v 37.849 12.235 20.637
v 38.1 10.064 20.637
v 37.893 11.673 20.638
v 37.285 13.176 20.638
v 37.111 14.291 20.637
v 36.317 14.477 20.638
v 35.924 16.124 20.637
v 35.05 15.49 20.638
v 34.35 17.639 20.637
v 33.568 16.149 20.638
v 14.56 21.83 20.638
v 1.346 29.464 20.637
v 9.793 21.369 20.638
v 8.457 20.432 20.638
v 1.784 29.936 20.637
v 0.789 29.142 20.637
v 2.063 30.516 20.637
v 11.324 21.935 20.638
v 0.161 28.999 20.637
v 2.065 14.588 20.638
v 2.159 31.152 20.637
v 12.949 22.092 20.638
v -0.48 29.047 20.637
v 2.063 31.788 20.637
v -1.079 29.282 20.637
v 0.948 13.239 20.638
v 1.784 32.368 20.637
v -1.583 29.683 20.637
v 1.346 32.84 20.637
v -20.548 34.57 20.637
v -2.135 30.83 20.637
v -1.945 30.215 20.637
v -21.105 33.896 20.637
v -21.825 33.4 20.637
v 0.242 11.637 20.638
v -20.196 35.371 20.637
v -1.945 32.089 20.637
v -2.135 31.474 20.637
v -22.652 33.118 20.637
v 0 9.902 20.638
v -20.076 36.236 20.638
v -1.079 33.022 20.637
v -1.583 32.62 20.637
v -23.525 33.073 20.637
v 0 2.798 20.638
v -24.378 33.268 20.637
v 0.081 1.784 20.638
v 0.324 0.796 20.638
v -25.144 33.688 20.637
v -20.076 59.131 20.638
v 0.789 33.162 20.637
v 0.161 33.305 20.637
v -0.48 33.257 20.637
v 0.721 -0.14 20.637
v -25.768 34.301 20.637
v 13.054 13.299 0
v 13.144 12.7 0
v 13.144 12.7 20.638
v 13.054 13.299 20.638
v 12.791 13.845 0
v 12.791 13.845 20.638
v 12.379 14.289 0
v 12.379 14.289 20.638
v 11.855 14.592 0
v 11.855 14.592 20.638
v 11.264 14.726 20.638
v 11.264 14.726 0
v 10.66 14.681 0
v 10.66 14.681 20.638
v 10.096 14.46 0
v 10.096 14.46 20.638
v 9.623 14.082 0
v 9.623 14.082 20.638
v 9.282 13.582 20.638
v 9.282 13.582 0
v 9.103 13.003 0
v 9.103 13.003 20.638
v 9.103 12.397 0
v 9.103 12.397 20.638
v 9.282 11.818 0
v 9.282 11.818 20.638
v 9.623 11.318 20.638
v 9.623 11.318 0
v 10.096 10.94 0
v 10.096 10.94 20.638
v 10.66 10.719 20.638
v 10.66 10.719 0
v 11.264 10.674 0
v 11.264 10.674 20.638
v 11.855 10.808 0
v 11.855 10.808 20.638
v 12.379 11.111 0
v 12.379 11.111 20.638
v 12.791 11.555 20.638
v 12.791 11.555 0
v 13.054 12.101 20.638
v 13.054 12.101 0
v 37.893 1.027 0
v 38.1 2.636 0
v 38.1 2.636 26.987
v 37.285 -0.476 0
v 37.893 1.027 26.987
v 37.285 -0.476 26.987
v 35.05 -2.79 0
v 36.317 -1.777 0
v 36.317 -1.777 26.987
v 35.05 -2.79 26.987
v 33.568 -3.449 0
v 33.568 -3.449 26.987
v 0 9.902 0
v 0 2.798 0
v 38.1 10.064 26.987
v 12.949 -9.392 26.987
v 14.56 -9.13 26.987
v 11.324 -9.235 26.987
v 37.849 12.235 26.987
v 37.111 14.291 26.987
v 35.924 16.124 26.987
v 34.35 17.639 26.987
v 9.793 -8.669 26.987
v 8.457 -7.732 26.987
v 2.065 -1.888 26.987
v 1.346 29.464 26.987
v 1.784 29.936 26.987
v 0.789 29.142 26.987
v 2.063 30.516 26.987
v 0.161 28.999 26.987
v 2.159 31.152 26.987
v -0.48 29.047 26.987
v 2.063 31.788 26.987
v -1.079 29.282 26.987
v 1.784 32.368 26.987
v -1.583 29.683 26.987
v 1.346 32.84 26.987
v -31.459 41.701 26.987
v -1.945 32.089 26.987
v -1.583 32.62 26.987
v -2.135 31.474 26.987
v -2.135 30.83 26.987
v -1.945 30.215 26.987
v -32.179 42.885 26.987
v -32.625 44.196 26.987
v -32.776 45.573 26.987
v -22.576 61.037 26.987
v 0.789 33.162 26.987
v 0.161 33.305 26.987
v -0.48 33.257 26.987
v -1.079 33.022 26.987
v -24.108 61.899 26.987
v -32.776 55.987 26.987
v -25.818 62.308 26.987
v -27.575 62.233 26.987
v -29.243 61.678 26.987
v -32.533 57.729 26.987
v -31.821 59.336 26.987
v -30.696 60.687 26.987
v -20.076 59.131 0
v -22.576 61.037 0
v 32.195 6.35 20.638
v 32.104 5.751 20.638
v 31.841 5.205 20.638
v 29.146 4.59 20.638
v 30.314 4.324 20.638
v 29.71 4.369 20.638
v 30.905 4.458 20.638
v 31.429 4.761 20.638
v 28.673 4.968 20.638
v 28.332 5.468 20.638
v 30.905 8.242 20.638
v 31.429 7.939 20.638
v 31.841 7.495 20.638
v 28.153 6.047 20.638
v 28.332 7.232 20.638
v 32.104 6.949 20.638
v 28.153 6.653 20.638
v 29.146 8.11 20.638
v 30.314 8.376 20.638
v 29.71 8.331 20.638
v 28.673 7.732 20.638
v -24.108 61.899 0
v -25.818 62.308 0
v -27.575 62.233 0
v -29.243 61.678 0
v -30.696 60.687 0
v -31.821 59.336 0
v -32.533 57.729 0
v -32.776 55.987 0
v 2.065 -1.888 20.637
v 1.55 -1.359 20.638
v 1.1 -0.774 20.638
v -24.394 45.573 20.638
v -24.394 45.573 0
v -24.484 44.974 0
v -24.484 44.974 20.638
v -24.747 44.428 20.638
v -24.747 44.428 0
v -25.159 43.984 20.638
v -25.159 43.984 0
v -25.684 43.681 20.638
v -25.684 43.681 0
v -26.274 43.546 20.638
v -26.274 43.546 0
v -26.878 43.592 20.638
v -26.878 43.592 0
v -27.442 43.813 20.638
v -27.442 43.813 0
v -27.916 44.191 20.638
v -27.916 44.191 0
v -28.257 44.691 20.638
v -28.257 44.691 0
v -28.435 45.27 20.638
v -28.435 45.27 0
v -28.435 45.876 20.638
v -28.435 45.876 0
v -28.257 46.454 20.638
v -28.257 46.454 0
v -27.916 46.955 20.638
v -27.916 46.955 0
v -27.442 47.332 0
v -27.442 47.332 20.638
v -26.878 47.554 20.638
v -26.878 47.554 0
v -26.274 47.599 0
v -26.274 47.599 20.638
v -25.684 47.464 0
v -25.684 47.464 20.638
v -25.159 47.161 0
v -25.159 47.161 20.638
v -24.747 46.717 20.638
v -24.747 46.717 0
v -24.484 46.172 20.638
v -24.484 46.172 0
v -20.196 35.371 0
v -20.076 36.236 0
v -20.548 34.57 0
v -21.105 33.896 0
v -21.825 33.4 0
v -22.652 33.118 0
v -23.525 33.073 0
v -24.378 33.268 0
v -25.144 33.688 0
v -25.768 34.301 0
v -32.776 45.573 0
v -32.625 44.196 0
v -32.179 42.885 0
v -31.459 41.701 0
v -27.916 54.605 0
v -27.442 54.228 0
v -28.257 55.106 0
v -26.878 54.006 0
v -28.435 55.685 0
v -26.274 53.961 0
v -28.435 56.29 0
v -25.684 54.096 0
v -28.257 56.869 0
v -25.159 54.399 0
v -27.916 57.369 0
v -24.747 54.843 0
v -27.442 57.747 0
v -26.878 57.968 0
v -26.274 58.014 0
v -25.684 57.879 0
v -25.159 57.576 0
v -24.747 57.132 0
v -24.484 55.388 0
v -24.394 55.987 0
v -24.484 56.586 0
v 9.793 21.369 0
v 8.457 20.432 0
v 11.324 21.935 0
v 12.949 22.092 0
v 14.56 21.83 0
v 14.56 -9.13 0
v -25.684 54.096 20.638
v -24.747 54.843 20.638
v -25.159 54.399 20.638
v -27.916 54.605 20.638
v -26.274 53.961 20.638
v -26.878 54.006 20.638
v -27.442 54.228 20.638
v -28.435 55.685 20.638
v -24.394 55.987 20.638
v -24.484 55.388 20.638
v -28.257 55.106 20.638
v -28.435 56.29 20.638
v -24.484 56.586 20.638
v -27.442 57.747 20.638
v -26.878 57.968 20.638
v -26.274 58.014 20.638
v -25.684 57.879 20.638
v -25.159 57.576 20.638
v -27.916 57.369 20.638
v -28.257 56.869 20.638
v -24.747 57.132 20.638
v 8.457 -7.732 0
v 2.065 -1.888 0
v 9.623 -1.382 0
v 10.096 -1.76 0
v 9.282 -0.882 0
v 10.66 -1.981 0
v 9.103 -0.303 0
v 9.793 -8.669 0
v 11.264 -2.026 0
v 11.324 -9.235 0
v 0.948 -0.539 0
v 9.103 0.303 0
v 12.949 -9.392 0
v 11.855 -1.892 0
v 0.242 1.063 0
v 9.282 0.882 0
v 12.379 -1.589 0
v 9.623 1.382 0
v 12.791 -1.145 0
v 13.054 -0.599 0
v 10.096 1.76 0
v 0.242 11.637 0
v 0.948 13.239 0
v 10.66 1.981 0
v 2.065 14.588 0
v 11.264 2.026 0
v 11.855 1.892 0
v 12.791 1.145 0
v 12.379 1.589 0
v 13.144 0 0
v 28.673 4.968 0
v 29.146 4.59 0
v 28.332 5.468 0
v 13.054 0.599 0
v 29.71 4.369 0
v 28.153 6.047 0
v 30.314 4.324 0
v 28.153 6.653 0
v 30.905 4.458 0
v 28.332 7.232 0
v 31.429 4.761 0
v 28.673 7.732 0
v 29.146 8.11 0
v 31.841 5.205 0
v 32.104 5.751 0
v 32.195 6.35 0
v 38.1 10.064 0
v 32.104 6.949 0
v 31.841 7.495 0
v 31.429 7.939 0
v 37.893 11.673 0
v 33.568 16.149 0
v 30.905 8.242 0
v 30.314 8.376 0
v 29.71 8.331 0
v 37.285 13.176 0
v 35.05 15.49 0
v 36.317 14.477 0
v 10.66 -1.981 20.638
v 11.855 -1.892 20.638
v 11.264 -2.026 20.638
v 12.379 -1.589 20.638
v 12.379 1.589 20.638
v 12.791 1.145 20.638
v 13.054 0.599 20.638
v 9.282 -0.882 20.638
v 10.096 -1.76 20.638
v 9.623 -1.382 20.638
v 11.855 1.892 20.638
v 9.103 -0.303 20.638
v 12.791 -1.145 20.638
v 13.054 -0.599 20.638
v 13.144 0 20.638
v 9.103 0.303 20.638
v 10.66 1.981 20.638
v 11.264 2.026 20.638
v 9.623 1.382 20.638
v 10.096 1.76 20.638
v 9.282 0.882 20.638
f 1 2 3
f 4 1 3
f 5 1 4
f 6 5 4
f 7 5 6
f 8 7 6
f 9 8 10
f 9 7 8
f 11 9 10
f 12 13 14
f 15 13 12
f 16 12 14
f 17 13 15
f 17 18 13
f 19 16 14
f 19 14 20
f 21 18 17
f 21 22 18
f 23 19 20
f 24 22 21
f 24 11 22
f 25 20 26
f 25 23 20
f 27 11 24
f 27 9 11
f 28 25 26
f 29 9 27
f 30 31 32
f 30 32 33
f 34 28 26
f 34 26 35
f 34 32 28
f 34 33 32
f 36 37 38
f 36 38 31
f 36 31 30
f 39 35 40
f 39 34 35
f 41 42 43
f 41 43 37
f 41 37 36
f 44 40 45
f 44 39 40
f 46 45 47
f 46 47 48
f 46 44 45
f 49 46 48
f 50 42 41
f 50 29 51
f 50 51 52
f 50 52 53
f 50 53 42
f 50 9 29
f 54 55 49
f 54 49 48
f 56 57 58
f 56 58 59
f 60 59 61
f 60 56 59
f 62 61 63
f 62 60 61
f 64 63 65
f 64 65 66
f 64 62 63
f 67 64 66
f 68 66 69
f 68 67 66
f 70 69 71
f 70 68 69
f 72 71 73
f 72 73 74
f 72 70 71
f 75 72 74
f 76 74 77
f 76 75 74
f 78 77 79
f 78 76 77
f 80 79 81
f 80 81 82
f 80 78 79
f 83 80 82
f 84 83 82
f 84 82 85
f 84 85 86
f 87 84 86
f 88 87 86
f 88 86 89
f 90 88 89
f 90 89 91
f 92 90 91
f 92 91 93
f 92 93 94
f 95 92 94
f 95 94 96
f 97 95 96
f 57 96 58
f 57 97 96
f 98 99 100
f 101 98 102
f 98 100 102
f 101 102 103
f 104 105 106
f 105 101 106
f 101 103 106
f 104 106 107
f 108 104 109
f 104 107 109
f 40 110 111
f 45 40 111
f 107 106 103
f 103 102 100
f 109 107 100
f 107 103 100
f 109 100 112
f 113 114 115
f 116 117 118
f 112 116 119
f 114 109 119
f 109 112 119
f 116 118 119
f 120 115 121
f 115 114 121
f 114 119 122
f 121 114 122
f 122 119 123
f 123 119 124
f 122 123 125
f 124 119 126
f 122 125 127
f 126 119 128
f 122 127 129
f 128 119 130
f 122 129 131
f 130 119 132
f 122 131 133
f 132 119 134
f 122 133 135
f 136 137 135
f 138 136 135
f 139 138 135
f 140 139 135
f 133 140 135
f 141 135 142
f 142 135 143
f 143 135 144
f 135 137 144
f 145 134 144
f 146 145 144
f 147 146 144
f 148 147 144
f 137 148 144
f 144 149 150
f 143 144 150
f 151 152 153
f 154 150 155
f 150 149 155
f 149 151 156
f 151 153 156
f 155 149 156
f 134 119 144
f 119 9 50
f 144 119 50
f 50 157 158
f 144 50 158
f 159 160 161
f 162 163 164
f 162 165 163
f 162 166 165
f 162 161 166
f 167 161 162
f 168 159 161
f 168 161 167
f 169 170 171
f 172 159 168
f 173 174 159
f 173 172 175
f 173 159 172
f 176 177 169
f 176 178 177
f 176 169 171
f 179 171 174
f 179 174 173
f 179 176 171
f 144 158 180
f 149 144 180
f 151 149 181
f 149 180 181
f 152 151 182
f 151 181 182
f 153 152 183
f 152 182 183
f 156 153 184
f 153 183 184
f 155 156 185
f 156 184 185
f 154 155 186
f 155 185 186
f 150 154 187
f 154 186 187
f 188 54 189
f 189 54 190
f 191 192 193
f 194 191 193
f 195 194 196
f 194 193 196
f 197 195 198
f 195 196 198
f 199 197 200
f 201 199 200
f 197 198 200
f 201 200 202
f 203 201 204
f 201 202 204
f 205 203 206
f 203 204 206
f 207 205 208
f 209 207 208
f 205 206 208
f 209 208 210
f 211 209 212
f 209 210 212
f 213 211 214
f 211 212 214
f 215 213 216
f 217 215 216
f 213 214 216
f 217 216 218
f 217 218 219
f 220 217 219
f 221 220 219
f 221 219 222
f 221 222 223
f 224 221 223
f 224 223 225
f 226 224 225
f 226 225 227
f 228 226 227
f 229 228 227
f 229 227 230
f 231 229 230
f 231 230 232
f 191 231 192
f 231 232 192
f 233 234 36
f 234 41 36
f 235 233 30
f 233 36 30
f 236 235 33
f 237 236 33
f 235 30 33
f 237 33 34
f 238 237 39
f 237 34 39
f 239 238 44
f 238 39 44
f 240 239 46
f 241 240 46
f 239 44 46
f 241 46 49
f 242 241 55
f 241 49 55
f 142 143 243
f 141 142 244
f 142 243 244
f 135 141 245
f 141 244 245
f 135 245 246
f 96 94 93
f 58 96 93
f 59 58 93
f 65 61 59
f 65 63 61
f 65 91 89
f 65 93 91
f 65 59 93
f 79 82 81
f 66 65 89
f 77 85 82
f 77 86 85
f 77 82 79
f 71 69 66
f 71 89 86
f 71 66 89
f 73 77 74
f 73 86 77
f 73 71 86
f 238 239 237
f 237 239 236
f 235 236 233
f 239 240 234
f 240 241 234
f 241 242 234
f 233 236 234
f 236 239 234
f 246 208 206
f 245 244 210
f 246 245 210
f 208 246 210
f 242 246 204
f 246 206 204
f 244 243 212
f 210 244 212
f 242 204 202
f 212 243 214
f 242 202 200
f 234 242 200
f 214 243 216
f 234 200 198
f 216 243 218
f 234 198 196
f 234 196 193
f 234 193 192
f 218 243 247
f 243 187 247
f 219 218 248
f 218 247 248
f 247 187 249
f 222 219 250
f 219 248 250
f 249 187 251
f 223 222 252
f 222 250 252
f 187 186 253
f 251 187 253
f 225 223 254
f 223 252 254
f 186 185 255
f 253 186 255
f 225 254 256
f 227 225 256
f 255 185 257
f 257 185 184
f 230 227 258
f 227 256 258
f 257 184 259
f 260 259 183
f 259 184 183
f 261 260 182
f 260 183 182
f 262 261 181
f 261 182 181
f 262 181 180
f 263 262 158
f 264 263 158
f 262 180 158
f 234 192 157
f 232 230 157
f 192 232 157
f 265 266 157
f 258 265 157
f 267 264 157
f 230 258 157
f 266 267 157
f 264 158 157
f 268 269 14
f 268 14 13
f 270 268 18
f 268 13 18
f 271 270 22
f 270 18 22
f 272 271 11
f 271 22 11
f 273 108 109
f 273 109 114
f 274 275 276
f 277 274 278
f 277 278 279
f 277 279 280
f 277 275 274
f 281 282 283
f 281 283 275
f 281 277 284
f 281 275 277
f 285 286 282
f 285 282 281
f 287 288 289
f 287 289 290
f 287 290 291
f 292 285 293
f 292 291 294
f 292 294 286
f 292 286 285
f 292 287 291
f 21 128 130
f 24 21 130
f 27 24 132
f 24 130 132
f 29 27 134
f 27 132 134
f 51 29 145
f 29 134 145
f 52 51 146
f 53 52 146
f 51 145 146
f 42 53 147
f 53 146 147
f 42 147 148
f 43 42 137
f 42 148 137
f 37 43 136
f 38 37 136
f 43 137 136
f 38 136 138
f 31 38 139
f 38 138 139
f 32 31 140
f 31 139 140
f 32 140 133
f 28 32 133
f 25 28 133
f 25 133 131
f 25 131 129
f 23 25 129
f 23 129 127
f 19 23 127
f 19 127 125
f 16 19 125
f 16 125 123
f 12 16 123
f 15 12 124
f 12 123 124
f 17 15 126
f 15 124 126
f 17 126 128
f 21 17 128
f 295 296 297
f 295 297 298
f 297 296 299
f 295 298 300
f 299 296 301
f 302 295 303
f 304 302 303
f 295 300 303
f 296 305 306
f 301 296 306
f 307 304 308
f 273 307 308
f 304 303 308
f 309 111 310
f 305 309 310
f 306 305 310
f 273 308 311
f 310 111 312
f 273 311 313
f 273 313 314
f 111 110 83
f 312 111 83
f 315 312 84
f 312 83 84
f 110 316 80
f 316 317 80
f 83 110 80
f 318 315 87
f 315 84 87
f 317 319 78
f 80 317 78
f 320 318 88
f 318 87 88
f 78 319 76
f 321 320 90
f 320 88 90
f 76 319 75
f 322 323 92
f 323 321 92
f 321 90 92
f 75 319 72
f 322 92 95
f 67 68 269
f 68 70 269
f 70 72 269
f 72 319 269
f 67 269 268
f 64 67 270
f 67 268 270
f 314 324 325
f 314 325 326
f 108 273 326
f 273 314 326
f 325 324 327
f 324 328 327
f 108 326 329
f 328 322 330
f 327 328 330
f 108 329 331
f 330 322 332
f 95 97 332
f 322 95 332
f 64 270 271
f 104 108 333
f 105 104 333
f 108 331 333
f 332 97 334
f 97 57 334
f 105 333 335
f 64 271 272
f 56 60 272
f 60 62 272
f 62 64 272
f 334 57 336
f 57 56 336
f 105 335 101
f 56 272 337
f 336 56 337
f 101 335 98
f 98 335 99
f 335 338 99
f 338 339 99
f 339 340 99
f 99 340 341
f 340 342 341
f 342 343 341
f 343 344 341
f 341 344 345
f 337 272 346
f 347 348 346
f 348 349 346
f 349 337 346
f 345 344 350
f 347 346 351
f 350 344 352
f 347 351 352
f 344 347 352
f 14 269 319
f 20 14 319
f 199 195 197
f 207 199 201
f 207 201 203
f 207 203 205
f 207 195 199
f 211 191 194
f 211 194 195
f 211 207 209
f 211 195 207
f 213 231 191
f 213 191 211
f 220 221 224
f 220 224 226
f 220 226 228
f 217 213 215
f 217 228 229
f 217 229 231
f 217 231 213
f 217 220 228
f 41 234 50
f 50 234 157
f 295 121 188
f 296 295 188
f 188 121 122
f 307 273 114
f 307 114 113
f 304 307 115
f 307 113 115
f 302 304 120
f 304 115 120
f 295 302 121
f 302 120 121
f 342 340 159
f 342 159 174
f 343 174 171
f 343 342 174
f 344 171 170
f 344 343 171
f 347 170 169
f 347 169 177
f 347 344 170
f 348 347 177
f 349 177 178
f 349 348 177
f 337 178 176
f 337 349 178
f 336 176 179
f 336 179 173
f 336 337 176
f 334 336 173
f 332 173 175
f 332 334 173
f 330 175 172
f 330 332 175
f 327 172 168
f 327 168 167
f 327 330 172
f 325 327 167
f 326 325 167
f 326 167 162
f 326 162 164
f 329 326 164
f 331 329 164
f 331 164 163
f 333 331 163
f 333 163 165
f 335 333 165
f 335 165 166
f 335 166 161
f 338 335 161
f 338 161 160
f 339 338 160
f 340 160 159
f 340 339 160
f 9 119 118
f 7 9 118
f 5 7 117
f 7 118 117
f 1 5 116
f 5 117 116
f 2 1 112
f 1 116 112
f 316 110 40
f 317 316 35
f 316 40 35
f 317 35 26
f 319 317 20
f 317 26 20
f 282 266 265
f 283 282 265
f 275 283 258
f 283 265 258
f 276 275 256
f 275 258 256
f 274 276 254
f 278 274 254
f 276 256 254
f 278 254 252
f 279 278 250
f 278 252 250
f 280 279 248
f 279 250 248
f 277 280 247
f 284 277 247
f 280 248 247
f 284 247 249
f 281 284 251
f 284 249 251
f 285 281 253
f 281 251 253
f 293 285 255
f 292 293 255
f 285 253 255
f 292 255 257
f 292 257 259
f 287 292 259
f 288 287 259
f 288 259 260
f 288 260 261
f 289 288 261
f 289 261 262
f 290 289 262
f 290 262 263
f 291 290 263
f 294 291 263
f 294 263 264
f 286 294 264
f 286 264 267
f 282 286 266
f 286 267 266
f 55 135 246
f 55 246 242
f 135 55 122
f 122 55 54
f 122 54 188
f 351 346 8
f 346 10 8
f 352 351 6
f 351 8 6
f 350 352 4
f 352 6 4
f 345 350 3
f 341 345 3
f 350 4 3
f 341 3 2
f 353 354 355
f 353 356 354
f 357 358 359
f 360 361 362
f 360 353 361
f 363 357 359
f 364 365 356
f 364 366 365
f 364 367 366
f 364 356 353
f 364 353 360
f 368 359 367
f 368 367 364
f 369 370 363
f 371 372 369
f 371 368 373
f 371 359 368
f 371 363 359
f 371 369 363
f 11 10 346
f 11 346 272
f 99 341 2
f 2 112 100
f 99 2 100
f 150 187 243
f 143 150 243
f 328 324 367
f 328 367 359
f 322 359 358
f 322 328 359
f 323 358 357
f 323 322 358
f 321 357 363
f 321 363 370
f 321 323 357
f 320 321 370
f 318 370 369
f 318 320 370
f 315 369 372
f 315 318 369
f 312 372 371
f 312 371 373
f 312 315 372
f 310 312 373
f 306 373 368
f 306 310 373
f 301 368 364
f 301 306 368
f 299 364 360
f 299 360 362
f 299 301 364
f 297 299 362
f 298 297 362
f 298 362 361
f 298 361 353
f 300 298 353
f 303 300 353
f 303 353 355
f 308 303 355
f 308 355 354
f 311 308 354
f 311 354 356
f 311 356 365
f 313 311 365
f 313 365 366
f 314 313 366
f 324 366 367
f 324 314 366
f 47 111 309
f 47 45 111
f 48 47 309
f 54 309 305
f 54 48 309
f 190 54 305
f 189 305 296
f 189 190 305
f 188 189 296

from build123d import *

# Parameters (mm, degrees)
SKETCH1_R           = 2.0319999999999987
SKETCH1_R_2         = 2.0320000000000005
BOSS_EXTRUDE1_DEPTH = 20.6375
FILLET1_R           = 6.35
BOSS_EXTRUDE2_START = 6.35
SKETCH3_R           = 2.159000000000005
BOSS_EXTRUDE2_DEPTH = 6.35
FILLET2_R           = 6.35
BOSS_EXTRUDE3_START = 20.6375
SKETCH4_R           = 2.032
BOSS_EXTRUDE3_DEPTH = 20.6375
FILLET3_R           = 3.175


with BuildPart() as part:
    # Sketch1 → Boss-Extrude1 (new body)
    with BuildSketch(Plane.XY):
        Polygon((0, 12.7), (0, 0), (11.112499999999999, -10.159999999999995), (38.1, -2.094157314500878), (38.1, 14.794157314500877), (11.112499999999999, 22.86), align=None)
        with Locations((11.112499999999999, 0)):
            Circle(SKETCH1_R, mode=Mode.SUBTRACT)
        with Locations((30.1625, 6.35)):
            Circle(SKETCH1_R_2, mode=Mode.SUBTRACT)
        with Locations((11.112499999999999, 12.7)):
            Circle(SKETCH1_R, mode=Mode.SUBTRACT)
    extrude(amount=BOSS_EXTRUDE1_DEPTH)

    # Fillet1
    fillet1_edges = [part.edges().sort_by_distance(p)[0] for p in [
        (0, 12.7, 10.31875),
        (11.112499999999999, 22.86, 10.31875),
        (38.1, 14.794157314500877, 10.31875),
        (38.1, -2.094157314500878, 10.31875),
        (11.112499999999999, -10.159999999999995, 10.31875),
        (0, 0, 10.31875),
    ]]
    fillet(fillet1_edges, radius=FILLET1_R)

    # Sketch3 → Boss-Extrude2 (add)
    with BuildSketch(Plane.XY.offset(20.6375).offset(BOSS_EXTRUDE2_START)):
        with BuildLine():
            Line((2.06521558288966, -1.888197104356259), (-32.77594211232474, 43.413196146372826))
            Line((-32.77594211232474, 43.413196146372826), (-32.77594211232474, 68.81319614637282))
            Line((-32.77594211232474, 68.81319614637282), (34.3497413303207, 17.639286263258136))
            ThreePointArc((34.3497413303207, 17.639286263258136), (37.1111008713377, 14.290641479729842), (38.1, 10.064460353186902))
            Line((38.1, 10.064460353186902), (38.1, 2.635539646813099))
            ThreePointArc((38.1, 2.635539646813099), (36.84259970760916, -1.157602614961311), (33.56836906517824, -3.448540722708889))
            Line((33.56836906517824, -3.448540722708889), (14.560051921917028, -9.129618843824993))
            ThreePointArc((14.560051921917028, -9.129618843824993), (11.324248271129079, -9.235318696210516), (8.456898439628453, -7.732021430517442))
            Line((8.456898439628453, -7.732021430517442), (2.06521558288966, -1.888197104356259))
        make_face()
        with Locations((1.57895919e-09, 31.151886065390322)):
            Circle(SKETCH3_R, mode=Mode.SUBTRACT)
    extrude(amount=-BOSS_EXTRUDE2_DEPTH)

    # Fillet2
    fillet2_edges = [part.edges().sort_by_distance(p)[0] for p in [
        (-32.77594211232474, 68.81319614637282, 23.812499999999996),
        (-32.77594211232474, 43.413196146372826, 23.812499999999996),
    ]]
    fillet(fillet2_edges, radius=FILLET2_R)

    # Sketch4 → Boss-Extrude3 (add)
    with BuildSketch(Plane(origin=(0, 0, 20.6375), x_dir=(-1, 0, 0), z_dir=(0, 0, -1)).offset(BOSS_EXTRUDE3_START)):
        with BuildLine():
            Line((32.77594211232474, 55.98737564555251), (32.77594211232474, 45.5726724047695))
            ThreePointArc((32.77594211232474, 45.5726724047695), (32.437811608681876, 43.52818587784627), (31.459430251294627, 41.701432660856774))
            Line((31.459430251294627, 41.701432660856774), (20.075942112324743, 26.900320790245356))
            Line((20.075942112324743, 26.900320790245356), (20.075942112324743, 59.13122909316789))
            Line((20.075942112324743, 59.13122909316789), (22.576114558777622, 61.03725958559999))
            ThreePointArc((22.576114558777622, 61.03725958559999), (29.243396196686703, 61.678109559777646), (32.77594211232474, 55.98737564555251))
        make_face()
        with Locations(Location((26.42594211232474, 55.98737564555251, 0), (0, 0, 180))):
            Circle(SKETCH4_R, mode=Mode.SUBTRACT)
        with Locations(Location((26.42594211232474, 45.5726724047695, 0), (0, 0, 180))):
            Circle(SKETCH4_R, mode=Mode.SUBTRACT)
    extrude(amount=-BOSS_EXTRUDE3_DEPTH)

    # Fillet3
    fillet3_edges = [part.edges().sort_by_distance(p)[0] for p in [
        (-20.075942112324743, 26.900320790245356, 10.31875),
    ]]
    fillet(fillet3_edges, radius=FILLET3_R)


solid = part.part
